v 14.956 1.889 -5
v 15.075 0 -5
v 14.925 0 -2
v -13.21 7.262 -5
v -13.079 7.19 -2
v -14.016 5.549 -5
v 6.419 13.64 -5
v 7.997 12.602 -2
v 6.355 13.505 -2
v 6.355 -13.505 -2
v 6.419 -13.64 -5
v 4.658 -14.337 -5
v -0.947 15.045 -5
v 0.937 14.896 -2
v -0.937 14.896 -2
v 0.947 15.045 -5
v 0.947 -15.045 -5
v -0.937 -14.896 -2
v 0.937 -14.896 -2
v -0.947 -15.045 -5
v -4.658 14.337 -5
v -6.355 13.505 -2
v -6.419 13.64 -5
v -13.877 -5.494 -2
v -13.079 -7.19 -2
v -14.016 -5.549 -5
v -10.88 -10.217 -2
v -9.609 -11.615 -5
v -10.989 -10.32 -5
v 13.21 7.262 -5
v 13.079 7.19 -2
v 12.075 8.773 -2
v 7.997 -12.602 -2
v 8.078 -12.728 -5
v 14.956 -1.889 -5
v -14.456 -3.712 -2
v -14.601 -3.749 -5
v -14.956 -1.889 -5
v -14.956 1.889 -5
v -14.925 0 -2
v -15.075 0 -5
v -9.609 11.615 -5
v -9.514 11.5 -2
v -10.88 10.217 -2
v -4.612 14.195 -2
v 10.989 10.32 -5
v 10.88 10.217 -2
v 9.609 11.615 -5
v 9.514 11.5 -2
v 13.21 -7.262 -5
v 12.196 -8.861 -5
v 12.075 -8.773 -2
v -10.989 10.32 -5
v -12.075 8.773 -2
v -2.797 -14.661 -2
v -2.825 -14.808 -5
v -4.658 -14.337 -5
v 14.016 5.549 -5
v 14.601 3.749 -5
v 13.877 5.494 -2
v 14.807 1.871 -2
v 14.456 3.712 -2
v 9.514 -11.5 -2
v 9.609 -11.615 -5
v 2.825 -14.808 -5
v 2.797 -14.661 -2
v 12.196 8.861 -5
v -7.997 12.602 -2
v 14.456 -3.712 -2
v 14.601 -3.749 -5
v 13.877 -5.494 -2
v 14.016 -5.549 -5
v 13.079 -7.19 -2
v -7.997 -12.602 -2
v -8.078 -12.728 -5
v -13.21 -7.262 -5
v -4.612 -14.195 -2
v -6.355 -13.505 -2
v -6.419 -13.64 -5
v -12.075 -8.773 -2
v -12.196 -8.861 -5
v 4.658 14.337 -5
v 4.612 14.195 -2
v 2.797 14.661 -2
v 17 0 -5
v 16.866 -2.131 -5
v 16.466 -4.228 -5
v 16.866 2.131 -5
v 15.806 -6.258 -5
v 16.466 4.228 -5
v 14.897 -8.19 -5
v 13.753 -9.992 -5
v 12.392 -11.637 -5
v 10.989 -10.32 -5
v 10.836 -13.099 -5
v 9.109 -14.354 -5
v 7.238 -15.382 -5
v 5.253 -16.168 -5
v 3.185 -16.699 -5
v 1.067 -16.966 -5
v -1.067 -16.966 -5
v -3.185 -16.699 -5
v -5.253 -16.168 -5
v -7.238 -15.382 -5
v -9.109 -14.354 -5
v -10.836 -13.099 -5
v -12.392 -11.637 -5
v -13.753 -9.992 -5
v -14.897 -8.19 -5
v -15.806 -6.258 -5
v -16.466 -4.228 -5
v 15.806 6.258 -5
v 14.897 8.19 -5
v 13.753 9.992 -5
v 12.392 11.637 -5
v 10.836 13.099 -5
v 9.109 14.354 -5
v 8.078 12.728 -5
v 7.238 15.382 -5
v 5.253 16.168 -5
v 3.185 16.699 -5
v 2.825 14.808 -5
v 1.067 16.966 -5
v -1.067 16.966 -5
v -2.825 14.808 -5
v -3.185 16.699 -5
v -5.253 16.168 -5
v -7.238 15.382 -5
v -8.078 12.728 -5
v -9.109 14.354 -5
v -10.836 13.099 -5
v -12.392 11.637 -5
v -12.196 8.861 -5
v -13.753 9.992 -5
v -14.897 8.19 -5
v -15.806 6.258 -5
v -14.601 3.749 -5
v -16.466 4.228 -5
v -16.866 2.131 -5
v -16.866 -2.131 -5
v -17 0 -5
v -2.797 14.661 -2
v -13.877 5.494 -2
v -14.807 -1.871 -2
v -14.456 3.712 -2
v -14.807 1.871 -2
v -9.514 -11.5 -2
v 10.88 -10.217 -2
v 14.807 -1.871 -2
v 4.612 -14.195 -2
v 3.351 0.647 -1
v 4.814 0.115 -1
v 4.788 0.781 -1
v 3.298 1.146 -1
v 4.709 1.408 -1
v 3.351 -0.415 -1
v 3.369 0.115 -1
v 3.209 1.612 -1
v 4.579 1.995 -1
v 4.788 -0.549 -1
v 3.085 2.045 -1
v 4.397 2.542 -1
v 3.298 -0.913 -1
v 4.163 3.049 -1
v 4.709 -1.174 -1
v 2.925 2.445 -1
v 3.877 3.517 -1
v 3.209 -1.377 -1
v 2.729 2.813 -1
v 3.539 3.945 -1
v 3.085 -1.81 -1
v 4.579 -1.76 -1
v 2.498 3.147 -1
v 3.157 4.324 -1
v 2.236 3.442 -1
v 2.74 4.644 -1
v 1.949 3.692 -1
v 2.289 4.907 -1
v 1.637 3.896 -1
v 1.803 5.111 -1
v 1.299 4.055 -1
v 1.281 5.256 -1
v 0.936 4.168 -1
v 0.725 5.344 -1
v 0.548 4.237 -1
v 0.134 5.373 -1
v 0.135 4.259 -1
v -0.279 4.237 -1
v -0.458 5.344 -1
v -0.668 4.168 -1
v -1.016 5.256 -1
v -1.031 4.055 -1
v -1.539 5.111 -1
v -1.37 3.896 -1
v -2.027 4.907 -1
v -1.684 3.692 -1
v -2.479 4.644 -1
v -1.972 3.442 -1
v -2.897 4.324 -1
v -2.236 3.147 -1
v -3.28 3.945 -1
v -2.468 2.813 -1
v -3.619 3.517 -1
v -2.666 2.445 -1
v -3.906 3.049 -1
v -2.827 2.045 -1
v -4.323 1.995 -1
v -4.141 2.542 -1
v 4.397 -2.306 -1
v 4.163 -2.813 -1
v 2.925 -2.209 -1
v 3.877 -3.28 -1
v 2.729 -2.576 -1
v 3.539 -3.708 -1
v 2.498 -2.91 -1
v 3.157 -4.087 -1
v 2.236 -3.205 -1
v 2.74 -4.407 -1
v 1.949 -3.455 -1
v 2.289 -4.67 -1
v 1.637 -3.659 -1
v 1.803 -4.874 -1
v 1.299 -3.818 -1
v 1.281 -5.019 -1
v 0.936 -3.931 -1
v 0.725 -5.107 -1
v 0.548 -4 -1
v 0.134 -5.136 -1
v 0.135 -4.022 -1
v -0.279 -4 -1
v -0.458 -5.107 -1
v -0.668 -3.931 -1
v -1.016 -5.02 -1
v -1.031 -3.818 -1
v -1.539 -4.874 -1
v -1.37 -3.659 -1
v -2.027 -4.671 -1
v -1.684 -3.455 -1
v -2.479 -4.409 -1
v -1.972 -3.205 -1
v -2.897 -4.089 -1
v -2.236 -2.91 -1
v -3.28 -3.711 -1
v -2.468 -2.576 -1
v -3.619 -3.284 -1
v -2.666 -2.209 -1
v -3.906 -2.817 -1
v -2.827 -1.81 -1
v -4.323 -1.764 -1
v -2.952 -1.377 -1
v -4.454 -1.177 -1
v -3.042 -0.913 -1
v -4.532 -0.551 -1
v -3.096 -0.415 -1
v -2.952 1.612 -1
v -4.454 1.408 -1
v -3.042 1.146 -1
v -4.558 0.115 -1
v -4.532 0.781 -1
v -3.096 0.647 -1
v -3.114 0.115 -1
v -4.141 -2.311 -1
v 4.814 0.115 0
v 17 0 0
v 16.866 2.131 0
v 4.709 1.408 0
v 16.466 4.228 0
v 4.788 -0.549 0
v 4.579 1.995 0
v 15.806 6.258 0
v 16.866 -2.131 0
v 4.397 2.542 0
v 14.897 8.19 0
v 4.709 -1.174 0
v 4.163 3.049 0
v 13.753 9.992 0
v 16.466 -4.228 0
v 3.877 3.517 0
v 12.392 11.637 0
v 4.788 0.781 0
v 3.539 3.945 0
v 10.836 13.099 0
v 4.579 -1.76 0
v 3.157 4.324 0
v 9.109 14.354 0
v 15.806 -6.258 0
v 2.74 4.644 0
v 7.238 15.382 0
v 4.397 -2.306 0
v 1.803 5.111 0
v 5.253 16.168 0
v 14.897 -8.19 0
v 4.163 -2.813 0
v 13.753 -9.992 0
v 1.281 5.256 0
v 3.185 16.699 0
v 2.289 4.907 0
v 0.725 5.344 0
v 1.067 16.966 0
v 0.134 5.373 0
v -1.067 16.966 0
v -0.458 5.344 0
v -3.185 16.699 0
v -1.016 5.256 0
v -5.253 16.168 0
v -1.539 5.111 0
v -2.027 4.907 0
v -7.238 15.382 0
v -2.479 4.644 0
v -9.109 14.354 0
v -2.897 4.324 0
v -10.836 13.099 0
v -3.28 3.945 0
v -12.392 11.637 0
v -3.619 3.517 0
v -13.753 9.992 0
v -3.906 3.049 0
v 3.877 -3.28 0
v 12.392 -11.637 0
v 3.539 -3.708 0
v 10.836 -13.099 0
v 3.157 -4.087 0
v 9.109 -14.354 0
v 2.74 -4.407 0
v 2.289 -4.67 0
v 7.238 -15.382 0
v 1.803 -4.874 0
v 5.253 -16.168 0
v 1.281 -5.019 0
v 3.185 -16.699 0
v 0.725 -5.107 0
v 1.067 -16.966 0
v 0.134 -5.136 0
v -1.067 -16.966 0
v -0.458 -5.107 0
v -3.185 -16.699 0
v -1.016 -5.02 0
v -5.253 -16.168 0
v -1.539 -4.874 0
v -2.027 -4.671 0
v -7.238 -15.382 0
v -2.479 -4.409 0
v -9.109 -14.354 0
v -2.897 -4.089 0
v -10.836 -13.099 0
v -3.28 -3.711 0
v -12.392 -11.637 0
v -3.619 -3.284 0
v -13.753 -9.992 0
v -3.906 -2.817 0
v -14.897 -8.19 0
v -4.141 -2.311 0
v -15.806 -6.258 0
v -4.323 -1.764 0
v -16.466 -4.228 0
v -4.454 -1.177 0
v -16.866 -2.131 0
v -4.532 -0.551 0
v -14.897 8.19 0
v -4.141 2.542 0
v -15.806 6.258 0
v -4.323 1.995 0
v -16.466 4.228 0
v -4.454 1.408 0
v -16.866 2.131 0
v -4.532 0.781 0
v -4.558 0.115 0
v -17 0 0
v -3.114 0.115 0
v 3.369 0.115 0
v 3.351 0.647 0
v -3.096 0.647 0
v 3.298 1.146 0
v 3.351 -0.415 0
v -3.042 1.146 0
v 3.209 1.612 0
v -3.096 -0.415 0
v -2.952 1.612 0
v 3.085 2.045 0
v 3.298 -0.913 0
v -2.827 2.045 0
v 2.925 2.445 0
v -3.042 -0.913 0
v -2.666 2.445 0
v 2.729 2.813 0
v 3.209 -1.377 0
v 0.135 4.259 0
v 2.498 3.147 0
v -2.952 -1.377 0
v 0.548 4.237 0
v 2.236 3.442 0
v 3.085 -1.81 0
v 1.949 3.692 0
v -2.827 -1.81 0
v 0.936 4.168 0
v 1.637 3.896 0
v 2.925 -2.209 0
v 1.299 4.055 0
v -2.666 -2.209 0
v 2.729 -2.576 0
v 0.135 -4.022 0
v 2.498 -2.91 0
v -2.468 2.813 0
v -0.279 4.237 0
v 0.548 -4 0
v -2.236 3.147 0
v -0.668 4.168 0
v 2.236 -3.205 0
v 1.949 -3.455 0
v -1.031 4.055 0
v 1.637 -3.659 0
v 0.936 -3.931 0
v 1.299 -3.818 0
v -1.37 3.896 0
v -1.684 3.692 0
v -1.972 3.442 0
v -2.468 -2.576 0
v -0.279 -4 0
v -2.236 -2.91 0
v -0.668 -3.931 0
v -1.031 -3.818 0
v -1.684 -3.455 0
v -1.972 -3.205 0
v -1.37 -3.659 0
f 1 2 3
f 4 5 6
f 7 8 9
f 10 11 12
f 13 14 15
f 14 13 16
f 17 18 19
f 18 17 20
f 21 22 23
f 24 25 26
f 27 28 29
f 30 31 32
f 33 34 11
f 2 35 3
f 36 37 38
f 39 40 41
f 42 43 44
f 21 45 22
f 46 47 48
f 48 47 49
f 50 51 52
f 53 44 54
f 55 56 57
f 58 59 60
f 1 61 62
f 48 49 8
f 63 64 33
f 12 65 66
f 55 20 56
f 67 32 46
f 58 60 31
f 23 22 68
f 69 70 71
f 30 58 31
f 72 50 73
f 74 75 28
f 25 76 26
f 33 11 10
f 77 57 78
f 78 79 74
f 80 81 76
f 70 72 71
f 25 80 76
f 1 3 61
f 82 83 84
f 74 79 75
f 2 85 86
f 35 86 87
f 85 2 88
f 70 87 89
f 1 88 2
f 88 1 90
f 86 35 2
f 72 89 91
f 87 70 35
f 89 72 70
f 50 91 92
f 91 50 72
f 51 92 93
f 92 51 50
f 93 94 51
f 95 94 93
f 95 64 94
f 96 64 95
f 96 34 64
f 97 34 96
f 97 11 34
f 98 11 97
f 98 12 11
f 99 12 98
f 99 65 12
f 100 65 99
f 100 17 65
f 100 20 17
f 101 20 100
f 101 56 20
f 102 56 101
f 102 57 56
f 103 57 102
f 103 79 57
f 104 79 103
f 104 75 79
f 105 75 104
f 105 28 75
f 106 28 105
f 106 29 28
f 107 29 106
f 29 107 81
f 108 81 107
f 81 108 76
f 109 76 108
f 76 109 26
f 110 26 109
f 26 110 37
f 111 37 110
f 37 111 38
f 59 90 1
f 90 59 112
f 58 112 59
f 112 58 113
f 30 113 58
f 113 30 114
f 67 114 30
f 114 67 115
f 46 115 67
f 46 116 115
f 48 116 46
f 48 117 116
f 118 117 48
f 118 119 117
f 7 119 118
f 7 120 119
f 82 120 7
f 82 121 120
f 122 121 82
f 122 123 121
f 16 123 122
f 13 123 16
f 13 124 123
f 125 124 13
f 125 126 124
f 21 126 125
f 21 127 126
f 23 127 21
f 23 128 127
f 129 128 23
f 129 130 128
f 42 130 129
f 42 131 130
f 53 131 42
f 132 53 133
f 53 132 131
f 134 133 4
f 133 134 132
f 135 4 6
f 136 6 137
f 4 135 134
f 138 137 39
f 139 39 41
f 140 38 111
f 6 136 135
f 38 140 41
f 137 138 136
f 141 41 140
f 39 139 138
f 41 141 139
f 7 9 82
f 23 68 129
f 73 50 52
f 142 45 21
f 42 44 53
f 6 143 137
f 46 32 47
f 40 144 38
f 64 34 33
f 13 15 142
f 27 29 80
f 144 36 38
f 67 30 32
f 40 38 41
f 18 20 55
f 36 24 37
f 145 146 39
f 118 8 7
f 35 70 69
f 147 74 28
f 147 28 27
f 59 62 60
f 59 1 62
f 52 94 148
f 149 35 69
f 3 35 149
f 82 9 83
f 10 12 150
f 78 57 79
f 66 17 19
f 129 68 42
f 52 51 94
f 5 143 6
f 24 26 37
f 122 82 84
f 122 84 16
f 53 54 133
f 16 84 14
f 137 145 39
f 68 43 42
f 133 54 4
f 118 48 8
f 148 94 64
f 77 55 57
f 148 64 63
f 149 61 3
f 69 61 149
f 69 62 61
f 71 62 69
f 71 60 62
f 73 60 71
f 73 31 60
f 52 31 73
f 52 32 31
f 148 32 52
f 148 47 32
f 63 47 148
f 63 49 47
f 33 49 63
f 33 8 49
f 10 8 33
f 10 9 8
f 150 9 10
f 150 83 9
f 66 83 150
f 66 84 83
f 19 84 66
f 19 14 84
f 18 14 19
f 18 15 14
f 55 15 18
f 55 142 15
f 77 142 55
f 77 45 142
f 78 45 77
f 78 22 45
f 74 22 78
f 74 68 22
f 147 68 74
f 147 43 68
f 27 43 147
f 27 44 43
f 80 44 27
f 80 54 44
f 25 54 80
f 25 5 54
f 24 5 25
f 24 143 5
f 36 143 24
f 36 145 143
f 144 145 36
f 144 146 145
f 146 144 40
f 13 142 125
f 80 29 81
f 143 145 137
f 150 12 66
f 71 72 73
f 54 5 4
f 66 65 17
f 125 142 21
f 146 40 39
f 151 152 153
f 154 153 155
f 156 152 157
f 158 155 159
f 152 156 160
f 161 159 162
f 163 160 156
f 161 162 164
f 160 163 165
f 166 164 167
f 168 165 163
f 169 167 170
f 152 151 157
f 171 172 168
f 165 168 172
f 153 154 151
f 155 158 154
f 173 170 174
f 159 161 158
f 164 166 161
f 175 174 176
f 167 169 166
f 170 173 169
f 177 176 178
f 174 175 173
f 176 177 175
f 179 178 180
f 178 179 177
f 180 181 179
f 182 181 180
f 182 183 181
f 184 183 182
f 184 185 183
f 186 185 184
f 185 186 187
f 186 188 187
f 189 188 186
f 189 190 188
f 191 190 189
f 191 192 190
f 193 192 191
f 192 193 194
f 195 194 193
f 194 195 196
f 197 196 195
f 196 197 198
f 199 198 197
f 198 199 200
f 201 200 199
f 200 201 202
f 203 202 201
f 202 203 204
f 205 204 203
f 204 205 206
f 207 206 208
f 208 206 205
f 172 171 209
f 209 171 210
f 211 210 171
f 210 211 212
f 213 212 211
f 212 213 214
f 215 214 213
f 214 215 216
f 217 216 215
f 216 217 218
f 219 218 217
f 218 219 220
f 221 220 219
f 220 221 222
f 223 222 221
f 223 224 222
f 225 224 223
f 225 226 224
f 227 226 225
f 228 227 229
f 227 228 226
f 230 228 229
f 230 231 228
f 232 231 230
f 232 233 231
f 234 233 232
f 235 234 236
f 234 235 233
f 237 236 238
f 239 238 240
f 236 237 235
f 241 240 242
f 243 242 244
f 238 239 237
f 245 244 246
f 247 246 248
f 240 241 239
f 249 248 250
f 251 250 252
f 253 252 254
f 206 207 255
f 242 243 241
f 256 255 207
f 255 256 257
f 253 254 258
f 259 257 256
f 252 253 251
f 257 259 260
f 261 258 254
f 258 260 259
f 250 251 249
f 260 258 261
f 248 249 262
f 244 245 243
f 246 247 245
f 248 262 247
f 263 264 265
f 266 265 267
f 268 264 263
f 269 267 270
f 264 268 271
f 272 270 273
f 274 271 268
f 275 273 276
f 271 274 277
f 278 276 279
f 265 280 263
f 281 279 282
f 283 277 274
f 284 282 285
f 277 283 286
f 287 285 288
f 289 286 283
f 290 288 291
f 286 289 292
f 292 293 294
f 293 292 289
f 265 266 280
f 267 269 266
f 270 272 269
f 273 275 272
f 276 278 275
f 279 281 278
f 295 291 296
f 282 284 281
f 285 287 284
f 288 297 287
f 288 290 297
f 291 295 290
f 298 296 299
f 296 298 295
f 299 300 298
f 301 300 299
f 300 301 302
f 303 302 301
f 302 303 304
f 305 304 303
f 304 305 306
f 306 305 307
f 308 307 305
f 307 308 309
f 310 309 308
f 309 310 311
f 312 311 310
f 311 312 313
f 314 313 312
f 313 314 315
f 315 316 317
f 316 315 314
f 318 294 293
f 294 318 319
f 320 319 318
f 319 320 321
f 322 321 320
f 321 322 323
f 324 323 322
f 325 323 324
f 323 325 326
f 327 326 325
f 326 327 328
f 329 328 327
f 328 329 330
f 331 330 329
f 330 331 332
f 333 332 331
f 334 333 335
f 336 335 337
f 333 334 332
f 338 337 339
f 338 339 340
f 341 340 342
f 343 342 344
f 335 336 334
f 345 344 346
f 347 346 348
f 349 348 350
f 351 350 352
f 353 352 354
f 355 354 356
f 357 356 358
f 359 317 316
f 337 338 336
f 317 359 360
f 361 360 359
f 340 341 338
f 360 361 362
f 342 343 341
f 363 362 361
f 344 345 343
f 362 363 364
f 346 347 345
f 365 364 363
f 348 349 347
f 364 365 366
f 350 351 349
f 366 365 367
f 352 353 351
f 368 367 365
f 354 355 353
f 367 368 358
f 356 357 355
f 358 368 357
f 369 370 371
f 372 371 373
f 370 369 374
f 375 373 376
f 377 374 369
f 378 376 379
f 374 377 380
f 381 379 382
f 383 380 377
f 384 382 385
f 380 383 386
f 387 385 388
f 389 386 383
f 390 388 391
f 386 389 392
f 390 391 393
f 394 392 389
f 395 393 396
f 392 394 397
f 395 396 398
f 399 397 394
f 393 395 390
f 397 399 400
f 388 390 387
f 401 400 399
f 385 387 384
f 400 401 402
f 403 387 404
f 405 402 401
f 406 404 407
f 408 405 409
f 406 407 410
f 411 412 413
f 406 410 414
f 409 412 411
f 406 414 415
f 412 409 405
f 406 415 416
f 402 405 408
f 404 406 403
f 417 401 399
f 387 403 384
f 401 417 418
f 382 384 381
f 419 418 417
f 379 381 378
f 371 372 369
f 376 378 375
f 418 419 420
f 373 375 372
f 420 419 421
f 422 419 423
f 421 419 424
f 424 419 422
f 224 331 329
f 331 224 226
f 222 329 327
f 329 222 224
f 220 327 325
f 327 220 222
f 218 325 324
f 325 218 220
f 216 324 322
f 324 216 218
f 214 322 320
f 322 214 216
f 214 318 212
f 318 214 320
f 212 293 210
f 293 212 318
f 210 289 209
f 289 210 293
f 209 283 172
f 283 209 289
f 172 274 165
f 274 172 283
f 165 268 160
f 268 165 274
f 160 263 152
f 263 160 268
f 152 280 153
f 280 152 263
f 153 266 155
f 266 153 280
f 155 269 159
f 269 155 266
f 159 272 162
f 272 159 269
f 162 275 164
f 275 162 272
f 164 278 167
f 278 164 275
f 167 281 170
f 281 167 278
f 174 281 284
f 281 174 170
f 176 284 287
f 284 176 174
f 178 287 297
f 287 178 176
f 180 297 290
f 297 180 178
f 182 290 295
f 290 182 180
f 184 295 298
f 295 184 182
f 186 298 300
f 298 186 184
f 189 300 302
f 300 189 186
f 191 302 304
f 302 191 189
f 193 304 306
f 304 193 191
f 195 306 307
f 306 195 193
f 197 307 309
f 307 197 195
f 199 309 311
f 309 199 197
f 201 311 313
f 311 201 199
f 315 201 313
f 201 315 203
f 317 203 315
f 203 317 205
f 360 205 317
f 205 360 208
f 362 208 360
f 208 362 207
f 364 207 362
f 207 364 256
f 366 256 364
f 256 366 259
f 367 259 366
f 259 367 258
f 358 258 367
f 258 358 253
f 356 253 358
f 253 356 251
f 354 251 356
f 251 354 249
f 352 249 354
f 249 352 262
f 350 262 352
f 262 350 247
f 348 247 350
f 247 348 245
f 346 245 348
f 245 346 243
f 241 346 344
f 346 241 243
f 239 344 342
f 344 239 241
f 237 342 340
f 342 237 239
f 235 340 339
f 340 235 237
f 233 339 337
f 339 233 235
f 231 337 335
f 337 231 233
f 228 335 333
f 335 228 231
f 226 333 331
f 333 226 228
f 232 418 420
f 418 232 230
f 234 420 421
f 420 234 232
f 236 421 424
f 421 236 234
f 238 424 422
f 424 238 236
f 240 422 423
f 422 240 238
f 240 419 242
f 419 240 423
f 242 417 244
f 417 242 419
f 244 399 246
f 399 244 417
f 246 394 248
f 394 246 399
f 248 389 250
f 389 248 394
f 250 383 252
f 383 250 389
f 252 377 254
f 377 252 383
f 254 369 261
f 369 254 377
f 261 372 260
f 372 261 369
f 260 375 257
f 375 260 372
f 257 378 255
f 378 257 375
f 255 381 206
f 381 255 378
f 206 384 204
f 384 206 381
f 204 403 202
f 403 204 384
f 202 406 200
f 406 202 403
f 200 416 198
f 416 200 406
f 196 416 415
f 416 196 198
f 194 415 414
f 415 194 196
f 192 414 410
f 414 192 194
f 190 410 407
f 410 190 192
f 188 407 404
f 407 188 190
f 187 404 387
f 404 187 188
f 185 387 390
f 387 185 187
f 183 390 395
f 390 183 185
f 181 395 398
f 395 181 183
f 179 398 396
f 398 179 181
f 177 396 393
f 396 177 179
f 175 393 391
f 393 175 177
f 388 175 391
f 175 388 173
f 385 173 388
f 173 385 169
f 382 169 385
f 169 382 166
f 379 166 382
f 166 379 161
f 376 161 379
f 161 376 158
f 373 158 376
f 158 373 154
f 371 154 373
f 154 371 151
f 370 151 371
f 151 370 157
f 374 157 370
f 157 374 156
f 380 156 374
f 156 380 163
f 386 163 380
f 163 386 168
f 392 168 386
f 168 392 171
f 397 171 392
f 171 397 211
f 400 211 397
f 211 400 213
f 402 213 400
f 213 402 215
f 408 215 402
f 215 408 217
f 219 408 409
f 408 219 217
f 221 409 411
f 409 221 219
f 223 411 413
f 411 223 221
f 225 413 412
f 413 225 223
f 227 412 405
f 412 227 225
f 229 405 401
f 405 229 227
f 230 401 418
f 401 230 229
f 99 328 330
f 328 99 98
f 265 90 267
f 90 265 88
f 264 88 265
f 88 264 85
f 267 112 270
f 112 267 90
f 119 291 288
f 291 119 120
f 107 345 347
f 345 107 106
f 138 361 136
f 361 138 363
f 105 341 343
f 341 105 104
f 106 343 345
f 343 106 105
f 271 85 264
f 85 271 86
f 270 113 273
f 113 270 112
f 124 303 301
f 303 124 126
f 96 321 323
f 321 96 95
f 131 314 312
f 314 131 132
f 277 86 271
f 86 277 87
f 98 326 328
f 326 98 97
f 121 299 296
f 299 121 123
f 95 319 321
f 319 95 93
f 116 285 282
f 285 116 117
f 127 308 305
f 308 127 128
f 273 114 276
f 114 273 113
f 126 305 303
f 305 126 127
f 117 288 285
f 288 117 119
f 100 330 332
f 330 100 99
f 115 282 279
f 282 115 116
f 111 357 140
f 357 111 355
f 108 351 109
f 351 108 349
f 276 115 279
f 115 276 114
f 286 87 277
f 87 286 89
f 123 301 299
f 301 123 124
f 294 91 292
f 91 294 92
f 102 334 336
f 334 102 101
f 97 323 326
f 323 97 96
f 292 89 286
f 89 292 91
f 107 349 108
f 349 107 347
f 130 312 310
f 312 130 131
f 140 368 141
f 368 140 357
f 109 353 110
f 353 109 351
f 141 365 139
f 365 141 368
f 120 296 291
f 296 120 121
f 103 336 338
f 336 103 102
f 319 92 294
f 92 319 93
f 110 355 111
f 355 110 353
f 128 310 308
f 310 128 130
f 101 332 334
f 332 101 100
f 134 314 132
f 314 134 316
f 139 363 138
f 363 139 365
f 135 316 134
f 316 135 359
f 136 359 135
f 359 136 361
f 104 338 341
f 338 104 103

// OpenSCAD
$fn = 50;

difference() {
	union() {
		translate(v = [0, 0, -5.0]) {
			cylinder(h = 5, r = 17.0);
		}
	}
	union() {
		#translate(v = [0, 0, -5.0]) {
			cylinder(h = 3, r1 = 15.075, r2 = 14.925);
		}
		translate(v = [0, 0, -1]) {
			linear_extrude(height = 1) {
				text(font = "Impact", halign = "center", size = 10, text = "O", valign = "center");
			}
		}
	}
}
